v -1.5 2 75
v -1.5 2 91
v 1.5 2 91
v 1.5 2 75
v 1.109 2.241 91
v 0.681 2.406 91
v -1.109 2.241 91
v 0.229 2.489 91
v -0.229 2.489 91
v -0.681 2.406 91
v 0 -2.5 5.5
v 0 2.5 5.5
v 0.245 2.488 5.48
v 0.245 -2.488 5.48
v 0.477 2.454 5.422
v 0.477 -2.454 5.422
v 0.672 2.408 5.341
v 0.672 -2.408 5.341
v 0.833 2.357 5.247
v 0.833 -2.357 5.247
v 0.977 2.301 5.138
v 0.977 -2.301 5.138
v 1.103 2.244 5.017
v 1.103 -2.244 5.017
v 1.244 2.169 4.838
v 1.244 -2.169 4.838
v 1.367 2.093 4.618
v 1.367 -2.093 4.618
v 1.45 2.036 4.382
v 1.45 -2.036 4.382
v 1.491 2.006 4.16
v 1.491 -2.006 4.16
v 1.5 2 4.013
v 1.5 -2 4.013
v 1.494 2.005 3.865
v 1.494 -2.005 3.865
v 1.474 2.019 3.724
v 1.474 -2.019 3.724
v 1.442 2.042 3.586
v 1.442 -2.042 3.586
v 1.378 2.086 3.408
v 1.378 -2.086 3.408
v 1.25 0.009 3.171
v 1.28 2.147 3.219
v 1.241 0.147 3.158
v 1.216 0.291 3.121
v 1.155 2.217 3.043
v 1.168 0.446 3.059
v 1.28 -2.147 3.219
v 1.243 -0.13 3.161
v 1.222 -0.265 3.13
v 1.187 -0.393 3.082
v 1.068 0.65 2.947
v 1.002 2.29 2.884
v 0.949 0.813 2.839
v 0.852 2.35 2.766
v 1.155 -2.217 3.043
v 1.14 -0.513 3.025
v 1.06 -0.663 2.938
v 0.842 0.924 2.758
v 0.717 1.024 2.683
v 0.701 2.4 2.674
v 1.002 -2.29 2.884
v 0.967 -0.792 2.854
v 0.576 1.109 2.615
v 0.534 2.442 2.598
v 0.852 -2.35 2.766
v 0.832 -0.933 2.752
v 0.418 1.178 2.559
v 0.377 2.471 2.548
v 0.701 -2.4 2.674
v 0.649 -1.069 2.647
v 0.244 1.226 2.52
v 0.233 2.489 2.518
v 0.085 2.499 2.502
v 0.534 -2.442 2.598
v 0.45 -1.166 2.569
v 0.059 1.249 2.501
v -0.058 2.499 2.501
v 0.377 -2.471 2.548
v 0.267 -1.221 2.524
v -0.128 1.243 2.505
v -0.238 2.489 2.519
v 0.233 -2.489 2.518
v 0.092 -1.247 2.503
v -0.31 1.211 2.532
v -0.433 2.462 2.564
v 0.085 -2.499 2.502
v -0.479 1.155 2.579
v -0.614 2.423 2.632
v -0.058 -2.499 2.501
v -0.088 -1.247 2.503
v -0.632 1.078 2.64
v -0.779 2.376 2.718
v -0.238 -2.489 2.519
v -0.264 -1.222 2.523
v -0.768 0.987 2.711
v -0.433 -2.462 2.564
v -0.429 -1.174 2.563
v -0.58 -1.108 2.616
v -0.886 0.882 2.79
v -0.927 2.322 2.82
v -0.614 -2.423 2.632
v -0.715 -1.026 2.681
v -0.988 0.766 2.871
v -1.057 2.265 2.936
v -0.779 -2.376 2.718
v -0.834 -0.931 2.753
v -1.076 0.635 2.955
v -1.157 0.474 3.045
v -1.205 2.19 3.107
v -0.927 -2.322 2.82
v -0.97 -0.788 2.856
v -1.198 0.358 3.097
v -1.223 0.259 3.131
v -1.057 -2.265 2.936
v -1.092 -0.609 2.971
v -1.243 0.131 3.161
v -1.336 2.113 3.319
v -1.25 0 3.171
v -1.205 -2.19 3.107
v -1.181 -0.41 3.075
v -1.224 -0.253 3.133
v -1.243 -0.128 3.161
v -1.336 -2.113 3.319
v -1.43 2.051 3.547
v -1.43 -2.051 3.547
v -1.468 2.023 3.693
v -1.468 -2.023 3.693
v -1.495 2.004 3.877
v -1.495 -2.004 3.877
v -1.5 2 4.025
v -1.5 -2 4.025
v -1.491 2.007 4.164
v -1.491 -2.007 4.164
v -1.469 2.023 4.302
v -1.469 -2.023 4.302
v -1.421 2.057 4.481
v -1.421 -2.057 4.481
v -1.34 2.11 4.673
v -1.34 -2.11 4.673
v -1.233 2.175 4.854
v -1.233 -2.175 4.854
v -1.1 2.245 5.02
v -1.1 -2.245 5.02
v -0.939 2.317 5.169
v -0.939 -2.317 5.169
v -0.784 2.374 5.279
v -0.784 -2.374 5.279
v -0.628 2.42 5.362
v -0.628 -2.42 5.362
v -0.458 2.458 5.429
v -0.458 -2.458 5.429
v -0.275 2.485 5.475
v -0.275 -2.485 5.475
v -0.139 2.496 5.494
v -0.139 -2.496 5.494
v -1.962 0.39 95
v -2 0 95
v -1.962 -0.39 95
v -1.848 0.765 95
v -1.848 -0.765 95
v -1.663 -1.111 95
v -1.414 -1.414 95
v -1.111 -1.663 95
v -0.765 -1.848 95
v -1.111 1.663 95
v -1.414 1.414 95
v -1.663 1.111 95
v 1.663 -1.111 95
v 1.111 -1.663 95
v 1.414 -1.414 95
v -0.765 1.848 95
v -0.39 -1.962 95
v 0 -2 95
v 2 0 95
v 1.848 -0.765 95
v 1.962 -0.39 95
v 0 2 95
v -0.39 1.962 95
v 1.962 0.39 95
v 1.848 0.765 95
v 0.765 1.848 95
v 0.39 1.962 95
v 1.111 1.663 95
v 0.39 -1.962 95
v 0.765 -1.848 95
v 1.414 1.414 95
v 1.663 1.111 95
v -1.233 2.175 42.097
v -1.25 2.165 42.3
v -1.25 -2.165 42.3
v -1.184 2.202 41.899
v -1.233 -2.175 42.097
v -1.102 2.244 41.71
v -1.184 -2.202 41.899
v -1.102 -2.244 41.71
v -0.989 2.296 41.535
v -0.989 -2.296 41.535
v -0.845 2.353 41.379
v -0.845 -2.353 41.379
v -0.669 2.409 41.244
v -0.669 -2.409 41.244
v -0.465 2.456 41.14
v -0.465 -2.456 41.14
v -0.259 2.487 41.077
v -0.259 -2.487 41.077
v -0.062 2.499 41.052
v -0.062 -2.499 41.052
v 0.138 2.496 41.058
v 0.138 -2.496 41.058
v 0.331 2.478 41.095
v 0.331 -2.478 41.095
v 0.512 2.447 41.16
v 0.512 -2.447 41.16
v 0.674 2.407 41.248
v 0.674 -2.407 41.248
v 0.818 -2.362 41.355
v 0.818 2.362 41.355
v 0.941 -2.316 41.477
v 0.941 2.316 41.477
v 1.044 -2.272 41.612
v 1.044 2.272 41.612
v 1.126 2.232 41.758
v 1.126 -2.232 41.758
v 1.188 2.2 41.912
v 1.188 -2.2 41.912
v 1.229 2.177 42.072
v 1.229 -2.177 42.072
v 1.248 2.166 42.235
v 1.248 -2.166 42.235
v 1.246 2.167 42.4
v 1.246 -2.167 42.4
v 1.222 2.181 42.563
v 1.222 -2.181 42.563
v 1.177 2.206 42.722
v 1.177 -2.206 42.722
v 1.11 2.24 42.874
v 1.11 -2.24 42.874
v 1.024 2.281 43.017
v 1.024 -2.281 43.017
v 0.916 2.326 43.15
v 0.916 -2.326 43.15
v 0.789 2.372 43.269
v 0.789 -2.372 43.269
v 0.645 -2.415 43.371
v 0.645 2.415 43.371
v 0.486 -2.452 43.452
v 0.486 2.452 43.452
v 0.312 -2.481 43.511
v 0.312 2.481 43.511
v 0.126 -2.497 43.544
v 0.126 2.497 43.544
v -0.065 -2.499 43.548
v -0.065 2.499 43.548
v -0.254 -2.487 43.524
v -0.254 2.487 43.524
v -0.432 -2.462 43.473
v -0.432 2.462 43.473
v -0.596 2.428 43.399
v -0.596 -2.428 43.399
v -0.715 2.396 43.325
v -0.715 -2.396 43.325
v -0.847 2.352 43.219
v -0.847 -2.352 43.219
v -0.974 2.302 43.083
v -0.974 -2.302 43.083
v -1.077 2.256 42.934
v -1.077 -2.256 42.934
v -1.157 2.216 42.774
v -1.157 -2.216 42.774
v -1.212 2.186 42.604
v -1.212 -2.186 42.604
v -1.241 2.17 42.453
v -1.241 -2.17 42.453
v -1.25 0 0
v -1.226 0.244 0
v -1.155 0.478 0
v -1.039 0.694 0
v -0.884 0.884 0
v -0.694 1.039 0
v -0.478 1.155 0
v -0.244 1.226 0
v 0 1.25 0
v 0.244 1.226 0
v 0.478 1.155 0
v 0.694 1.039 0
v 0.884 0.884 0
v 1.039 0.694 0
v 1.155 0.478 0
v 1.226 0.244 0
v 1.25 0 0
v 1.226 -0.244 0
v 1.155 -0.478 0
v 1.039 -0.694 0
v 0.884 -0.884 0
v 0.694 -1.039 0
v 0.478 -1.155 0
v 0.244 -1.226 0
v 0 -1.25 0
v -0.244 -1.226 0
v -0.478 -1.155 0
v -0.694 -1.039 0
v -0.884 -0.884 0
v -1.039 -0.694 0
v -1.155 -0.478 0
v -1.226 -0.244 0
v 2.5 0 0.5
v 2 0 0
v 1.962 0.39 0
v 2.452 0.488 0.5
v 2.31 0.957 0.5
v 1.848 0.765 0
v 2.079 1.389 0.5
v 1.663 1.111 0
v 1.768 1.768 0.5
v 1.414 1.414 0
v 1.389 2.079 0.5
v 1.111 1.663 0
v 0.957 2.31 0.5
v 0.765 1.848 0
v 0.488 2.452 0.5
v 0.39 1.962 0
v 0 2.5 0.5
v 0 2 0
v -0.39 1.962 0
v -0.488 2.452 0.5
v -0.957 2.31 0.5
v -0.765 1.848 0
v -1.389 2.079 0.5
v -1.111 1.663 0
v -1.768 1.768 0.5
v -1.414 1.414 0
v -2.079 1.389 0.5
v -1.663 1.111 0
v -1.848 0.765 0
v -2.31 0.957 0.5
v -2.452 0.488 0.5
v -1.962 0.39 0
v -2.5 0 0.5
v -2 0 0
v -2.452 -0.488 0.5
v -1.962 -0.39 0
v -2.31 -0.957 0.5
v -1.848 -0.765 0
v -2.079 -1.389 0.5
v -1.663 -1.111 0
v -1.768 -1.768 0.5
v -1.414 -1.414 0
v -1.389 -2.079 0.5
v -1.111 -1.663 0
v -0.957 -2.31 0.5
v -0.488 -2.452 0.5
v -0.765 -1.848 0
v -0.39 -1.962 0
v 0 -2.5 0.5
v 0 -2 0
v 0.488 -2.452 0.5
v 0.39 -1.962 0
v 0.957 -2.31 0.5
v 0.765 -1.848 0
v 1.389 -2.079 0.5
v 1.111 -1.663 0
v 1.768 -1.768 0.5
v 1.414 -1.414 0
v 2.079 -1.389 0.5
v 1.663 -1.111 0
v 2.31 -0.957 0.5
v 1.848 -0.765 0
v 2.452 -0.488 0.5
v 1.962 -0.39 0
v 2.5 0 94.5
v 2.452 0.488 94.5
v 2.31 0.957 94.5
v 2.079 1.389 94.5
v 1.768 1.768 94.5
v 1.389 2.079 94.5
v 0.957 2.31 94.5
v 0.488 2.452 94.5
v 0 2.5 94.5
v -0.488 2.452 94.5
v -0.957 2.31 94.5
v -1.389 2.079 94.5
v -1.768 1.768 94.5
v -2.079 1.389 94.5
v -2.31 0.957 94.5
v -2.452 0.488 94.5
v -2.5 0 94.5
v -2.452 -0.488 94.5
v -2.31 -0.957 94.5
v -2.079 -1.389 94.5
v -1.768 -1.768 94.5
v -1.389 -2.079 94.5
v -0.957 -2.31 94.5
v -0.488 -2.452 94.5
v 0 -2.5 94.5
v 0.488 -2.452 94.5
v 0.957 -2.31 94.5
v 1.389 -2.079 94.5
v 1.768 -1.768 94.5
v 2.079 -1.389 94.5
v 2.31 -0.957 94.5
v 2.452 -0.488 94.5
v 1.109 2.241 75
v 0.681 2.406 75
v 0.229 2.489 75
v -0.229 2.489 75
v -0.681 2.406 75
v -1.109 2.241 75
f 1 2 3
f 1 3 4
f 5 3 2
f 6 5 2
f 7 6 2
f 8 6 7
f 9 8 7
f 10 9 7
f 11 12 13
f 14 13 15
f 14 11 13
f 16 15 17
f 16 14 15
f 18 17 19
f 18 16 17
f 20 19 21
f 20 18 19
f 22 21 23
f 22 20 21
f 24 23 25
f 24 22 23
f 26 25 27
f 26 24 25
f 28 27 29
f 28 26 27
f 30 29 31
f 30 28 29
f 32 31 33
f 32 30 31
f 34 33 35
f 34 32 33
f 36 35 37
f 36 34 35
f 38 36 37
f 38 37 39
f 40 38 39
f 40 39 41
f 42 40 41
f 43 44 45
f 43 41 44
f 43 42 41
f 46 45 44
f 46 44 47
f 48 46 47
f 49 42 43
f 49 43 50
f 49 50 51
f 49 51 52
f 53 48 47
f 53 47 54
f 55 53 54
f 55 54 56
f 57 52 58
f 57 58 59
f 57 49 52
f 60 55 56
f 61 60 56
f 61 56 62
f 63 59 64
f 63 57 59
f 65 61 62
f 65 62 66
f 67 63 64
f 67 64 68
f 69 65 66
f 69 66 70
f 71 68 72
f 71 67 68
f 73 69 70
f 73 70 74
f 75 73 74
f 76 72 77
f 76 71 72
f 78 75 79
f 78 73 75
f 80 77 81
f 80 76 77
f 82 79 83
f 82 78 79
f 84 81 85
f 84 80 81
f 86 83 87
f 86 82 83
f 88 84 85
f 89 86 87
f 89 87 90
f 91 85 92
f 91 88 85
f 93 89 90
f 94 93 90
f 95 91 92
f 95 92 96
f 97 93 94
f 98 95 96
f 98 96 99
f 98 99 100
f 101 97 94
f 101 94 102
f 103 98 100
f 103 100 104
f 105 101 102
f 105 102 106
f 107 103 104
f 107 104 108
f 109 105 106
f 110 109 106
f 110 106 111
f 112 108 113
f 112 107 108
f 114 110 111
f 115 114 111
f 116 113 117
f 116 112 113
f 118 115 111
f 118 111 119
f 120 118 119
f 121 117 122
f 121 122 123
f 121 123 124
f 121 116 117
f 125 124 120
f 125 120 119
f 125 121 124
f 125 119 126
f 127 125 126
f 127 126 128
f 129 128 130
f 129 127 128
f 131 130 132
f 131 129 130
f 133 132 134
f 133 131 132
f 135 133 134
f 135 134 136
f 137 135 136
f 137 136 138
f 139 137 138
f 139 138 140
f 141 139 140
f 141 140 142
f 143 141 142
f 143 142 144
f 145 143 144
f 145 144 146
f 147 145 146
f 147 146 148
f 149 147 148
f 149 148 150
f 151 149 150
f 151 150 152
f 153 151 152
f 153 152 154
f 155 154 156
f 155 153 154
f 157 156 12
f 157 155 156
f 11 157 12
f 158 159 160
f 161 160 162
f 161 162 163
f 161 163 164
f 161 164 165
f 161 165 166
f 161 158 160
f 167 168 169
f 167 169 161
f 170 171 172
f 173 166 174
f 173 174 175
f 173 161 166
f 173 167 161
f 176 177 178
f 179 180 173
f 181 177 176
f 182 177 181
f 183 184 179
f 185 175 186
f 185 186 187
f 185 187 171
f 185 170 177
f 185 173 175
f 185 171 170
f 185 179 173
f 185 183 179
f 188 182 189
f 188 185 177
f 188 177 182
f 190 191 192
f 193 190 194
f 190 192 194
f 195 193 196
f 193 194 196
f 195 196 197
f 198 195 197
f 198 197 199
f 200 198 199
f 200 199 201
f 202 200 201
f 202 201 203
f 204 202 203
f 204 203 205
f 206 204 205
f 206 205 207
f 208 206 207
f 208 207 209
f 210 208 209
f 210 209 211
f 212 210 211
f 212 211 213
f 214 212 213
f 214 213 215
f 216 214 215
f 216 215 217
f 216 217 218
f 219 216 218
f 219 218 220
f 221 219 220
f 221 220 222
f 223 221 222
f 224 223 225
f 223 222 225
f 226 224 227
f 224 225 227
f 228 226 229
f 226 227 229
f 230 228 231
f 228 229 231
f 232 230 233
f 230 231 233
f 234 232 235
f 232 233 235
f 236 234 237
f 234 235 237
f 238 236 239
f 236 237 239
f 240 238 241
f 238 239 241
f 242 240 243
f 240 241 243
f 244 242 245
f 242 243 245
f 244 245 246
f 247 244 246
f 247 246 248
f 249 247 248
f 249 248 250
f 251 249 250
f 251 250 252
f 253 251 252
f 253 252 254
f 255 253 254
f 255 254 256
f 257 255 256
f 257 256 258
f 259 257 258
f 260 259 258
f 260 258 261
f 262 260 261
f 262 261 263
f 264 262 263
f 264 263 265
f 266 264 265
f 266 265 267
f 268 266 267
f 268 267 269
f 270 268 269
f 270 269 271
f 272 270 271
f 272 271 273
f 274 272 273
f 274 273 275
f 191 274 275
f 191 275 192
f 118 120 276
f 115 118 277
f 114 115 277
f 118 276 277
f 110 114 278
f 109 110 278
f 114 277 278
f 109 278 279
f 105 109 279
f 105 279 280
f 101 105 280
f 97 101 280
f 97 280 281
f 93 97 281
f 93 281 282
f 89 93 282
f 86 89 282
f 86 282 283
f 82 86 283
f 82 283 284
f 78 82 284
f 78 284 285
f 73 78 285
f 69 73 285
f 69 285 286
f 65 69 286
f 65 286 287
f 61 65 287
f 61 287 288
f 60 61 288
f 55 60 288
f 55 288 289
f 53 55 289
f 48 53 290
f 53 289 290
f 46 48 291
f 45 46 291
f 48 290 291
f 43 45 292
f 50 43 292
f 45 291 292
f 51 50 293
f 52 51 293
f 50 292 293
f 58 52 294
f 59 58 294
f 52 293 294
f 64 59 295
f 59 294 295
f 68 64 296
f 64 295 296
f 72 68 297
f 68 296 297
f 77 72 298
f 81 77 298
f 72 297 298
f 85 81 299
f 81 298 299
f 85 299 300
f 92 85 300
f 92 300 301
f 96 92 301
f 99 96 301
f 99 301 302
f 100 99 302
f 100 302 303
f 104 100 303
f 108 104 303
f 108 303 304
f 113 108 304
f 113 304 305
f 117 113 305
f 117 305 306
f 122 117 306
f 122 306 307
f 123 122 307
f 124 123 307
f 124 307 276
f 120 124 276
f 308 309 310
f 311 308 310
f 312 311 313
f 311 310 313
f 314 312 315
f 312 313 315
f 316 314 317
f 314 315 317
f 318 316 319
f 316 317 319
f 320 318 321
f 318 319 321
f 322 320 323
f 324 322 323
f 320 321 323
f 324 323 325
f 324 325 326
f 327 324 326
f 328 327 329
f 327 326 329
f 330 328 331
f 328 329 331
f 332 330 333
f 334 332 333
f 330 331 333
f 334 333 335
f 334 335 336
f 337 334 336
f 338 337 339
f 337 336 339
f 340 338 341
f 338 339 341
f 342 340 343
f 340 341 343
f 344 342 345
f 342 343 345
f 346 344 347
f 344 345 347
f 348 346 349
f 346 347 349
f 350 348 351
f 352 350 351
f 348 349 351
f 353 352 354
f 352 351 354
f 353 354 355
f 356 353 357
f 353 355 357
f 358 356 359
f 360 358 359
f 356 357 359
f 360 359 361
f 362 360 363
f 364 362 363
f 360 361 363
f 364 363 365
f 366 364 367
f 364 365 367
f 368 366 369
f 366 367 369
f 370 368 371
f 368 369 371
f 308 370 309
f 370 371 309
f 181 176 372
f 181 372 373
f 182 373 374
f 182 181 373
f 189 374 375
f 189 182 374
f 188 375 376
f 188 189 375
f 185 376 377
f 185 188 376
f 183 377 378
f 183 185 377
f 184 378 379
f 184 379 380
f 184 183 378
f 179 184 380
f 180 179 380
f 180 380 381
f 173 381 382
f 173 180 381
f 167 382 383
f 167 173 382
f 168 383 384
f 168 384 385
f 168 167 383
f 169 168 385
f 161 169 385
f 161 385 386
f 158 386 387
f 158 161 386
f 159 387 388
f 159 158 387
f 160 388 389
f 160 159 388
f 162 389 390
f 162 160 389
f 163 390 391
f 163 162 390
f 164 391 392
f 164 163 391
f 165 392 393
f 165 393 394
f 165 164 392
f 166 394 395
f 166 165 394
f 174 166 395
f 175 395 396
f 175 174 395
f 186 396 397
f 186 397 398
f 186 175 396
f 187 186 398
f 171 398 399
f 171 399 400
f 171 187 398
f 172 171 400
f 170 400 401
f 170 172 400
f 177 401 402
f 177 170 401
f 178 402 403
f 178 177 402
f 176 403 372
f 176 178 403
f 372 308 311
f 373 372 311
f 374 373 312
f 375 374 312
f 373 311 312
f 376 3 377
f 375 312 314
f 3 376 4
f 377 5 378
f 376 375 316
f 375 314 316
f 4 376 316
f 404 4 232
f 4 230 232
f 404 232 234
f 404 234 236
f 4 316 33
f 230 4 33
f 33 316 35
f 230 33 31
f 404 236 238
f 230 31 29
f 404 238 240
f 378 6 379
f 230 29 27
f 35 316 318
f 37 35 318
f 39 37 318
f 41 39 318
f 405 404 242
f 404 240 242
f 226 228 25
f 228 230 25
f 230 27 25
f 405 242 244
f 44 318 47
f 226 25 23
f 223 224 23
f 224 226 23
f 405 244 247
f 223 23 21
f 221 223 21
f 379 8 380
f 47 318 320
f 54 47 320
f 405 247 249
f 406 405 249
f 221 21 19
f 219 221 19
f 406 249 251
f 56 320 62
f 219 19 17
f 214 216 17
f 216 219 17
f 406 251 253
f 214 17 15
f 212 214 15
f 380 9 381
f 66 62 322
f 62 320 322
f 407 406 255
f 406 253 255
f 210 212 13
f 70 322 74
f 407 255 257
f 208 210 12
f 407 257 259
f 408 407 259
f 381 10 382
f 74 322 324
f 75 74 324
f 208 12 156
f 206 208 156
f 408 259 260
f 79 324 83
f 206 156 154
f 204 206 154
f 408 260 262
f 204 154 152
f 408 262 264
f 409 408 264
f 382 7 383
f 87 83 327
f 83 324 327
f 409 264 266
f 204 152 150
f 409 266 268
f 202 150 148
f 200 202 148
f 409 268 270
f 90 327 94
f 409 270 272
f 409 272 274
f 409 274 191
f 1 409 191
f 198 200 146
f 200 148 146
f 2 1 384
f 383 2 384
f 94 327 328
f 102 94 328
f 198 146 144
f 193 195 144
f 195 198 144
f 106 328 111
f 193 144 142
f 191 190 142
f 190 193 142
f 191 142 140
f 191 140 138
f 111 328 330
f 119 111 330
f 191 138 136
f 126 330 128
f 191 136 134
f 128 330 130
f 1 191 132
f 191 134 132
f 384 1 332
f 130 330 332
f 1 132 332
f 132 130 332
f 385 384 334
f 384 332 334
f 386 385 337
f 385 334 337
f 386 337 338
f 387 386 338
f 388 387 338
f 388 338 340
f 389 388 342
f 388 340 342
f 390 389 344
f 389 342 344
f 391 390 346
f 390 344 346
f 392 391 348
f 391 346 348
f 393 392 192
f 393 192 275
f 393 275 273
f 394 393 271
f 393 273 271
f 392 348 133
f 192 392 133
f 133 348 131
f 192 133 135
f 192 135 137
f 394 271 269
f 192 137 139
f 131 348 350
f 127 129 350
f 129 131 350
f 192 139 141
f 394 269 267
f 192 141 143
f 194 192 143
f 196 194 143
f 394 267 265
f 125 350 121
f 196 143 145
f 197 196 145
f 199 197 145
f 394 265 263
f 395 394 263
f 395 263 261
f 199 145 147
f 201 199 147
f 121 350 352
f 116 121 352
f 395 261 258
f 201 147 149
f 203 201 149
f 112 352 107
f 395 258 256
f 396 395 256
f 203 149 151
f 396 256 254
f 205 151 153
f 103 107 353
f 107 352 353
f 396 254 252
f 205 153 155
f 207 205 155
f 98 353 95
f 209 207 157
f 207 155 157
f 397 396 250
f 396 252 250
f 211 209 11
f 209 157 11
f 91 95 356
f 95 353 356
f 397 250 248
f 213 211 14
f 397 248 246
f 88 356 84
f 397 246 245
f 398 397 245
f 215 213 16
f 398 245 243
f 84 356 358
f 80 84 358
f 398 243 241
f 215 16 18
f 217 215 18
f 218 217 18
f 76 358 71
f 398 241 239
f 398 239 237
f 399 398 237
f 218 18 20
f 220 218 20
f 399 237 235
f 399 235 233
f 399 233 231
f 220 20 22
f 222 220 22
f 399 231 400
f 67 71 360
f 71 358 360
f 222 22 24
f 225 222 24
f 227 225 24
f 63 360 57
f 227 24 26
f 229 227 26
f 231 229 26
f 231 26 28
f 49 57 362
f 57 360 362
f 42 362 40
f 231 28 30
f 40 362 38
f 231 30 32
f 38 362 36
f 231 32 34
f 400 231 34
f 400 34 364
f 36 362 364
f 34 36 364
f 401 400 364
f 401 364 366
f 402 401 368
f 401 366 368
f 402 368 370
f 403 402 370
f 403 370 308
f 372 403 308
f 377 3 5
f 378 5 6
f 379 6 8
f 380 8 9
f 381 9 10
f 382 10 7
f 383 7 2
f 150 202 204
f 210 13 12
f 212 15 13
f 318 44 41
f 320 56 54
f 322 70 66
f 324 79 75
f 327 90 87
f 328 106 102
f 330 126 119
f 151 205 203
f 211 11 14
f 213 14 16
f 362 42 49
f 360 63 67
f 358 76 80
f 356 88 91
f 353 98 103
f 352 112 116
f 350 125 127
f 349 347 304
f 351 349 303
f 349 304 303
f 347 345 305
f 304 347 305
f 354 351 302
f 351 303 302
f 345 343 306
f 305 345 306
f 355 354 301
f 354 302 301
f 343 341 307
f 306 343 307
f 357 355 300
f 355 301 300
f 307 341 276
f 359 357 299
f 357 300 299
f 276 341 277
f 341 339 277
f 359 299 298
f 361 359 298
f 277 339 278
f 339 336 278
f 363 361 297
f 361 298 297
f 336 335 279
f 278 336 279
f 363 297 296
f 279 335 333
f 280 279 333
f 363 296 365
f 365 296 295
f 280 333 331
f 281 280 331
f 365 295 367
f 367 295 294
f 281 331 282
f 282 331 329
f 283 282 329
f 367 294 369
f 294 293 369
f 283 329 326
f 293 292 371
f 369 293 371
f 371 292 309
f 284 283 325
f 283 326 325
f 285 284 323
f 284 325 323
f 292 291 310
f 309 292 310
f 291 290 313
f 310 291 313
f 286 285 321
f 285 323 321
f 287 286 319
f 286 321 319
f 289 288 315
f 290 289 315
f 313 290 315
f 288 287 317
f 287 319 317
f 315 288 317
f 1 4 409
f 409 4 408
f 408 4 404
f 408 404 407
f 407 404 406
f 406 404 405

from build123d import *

# Parameters (mm, degrees)
SKETCH1_R                  = 2.5
BOSS_EXTRUDE1_DEPTH        = 95
CUT_EXTRUDE1_DEPTH         = 96.065766709
CUT_EXTRUDE1_DEPTH_BACK    = 96.065766709
SKETCH2_R                  = 1.5
CHAMFER1_SIZE              = 0.5
M3X0_5_TAPPED_HOLE1_REACH  = 97.066
M3X0_5_TAPPED_HOLE1_BORE_R = 1.25
CUT_EXTRUDE2_DEPTH         = 96.065766714
CUT_EXTRUDE2_DEPTH_BACK    = 96.065766714
SKETCH6_W                  = 16
SKETCH6_H                  = 0.5
M3X0_5_TAPPED_HOLE2_D      = 2.5


with BuildPart() as part:
    # Sketch1 → Boss-Extrude1 (new body)
    with BuildSketch(Plane.XY):
        Circle(SKETCH1_R)
    extrude(amount=BOSS_EXTRUDE1_DEPTH)

    # Sketch2 → Cut-Extrude1 (cut, two sides: drawn at the far end of the back side and taken through both)
    with BuildSketch(Plane(origin=(0, 0, 0), x_dir=(1, 0, 0), z_dir=(0, 1, 0)).offset(-CUT_EXTRUDE1_DEPTH_BACK)):
        with Locations(Location((0, -4, 0), (0, 0, 270))):
            Circle(SKETCH2_R)
    extrude(amount=CUT_EXTRUDE1_DEPTH + CUT_EXTRUDE1_DEPTH_BACK, mode=Mode.SUBTRACT)

    # Chamfer1
    chamfer1_edges = [part.edges().sort_by_distance(p)[0] for p in [
        (-2.5, 0, 0),
        (-2.5, 0, 95),
    ]]
    chamfer(chamfer1_edges, length=CHAMFER1_SIZE)

    # M3x0.5 Tapped Hole1 bore → M3x0.5 Tapped Hole1 (cut, up to next)
    with BuildSketch(Plane(origin=(0, 0, 0), x_dir=(-1, 0, 0), z_dir=(0, 0, -1)), mode=Mode.PRIVATE) as m3x0_5_tapped_hole1_sk1:
        Circle(M3X0_5_TAPPED_HOLE1_BORE_R)
    m3x0_5_tapped_hole1_tool1 = extrude(m3x0_5_tapped_hole1_sk1.sketch, amount=-M3X0_5_TAPPED_HOLE1_REACH, mode=Mode.PRIVATE) & part.part
    add(m3x0_5_tapped_hole1_tool1.solids().sort_by_distance((0, 0, 0))[0], mode=Mode.SUBTRACT)

    # Sketch6 → Cut-Extrude2 (cut, two sides: drawn at the far end of the back side and taken through both)
    with BuildSketch(Plane(origin=(0, 0, 0), x_dir=(0, 0, -1), z_dir=(1, 0, 0)).offset(-CUT_EXTRUDE2_DEPTH_BACK)):
        with Locations((-83, 2.25)):
            Rectangle(SKETCH6_W, SKETCH6_H)
    extrude(amount=CUT_EXTRUDE2_DEPTH + CUT_EXTRUDE2_DEPTH_BACK, mode=Mode.SUBTRACT)

    # M3x0.5 Tapped Hole2 (through all)
    with Locations(Plane(origin=(0, 3, 0), x_dir=(1, 0, 0), z_dir=(0, 1, 0))):
        with Locations((0, -42.3)):
            Hole(M3X0_5_TAPPED_HOLE2_D / 2)


solid = part.part
